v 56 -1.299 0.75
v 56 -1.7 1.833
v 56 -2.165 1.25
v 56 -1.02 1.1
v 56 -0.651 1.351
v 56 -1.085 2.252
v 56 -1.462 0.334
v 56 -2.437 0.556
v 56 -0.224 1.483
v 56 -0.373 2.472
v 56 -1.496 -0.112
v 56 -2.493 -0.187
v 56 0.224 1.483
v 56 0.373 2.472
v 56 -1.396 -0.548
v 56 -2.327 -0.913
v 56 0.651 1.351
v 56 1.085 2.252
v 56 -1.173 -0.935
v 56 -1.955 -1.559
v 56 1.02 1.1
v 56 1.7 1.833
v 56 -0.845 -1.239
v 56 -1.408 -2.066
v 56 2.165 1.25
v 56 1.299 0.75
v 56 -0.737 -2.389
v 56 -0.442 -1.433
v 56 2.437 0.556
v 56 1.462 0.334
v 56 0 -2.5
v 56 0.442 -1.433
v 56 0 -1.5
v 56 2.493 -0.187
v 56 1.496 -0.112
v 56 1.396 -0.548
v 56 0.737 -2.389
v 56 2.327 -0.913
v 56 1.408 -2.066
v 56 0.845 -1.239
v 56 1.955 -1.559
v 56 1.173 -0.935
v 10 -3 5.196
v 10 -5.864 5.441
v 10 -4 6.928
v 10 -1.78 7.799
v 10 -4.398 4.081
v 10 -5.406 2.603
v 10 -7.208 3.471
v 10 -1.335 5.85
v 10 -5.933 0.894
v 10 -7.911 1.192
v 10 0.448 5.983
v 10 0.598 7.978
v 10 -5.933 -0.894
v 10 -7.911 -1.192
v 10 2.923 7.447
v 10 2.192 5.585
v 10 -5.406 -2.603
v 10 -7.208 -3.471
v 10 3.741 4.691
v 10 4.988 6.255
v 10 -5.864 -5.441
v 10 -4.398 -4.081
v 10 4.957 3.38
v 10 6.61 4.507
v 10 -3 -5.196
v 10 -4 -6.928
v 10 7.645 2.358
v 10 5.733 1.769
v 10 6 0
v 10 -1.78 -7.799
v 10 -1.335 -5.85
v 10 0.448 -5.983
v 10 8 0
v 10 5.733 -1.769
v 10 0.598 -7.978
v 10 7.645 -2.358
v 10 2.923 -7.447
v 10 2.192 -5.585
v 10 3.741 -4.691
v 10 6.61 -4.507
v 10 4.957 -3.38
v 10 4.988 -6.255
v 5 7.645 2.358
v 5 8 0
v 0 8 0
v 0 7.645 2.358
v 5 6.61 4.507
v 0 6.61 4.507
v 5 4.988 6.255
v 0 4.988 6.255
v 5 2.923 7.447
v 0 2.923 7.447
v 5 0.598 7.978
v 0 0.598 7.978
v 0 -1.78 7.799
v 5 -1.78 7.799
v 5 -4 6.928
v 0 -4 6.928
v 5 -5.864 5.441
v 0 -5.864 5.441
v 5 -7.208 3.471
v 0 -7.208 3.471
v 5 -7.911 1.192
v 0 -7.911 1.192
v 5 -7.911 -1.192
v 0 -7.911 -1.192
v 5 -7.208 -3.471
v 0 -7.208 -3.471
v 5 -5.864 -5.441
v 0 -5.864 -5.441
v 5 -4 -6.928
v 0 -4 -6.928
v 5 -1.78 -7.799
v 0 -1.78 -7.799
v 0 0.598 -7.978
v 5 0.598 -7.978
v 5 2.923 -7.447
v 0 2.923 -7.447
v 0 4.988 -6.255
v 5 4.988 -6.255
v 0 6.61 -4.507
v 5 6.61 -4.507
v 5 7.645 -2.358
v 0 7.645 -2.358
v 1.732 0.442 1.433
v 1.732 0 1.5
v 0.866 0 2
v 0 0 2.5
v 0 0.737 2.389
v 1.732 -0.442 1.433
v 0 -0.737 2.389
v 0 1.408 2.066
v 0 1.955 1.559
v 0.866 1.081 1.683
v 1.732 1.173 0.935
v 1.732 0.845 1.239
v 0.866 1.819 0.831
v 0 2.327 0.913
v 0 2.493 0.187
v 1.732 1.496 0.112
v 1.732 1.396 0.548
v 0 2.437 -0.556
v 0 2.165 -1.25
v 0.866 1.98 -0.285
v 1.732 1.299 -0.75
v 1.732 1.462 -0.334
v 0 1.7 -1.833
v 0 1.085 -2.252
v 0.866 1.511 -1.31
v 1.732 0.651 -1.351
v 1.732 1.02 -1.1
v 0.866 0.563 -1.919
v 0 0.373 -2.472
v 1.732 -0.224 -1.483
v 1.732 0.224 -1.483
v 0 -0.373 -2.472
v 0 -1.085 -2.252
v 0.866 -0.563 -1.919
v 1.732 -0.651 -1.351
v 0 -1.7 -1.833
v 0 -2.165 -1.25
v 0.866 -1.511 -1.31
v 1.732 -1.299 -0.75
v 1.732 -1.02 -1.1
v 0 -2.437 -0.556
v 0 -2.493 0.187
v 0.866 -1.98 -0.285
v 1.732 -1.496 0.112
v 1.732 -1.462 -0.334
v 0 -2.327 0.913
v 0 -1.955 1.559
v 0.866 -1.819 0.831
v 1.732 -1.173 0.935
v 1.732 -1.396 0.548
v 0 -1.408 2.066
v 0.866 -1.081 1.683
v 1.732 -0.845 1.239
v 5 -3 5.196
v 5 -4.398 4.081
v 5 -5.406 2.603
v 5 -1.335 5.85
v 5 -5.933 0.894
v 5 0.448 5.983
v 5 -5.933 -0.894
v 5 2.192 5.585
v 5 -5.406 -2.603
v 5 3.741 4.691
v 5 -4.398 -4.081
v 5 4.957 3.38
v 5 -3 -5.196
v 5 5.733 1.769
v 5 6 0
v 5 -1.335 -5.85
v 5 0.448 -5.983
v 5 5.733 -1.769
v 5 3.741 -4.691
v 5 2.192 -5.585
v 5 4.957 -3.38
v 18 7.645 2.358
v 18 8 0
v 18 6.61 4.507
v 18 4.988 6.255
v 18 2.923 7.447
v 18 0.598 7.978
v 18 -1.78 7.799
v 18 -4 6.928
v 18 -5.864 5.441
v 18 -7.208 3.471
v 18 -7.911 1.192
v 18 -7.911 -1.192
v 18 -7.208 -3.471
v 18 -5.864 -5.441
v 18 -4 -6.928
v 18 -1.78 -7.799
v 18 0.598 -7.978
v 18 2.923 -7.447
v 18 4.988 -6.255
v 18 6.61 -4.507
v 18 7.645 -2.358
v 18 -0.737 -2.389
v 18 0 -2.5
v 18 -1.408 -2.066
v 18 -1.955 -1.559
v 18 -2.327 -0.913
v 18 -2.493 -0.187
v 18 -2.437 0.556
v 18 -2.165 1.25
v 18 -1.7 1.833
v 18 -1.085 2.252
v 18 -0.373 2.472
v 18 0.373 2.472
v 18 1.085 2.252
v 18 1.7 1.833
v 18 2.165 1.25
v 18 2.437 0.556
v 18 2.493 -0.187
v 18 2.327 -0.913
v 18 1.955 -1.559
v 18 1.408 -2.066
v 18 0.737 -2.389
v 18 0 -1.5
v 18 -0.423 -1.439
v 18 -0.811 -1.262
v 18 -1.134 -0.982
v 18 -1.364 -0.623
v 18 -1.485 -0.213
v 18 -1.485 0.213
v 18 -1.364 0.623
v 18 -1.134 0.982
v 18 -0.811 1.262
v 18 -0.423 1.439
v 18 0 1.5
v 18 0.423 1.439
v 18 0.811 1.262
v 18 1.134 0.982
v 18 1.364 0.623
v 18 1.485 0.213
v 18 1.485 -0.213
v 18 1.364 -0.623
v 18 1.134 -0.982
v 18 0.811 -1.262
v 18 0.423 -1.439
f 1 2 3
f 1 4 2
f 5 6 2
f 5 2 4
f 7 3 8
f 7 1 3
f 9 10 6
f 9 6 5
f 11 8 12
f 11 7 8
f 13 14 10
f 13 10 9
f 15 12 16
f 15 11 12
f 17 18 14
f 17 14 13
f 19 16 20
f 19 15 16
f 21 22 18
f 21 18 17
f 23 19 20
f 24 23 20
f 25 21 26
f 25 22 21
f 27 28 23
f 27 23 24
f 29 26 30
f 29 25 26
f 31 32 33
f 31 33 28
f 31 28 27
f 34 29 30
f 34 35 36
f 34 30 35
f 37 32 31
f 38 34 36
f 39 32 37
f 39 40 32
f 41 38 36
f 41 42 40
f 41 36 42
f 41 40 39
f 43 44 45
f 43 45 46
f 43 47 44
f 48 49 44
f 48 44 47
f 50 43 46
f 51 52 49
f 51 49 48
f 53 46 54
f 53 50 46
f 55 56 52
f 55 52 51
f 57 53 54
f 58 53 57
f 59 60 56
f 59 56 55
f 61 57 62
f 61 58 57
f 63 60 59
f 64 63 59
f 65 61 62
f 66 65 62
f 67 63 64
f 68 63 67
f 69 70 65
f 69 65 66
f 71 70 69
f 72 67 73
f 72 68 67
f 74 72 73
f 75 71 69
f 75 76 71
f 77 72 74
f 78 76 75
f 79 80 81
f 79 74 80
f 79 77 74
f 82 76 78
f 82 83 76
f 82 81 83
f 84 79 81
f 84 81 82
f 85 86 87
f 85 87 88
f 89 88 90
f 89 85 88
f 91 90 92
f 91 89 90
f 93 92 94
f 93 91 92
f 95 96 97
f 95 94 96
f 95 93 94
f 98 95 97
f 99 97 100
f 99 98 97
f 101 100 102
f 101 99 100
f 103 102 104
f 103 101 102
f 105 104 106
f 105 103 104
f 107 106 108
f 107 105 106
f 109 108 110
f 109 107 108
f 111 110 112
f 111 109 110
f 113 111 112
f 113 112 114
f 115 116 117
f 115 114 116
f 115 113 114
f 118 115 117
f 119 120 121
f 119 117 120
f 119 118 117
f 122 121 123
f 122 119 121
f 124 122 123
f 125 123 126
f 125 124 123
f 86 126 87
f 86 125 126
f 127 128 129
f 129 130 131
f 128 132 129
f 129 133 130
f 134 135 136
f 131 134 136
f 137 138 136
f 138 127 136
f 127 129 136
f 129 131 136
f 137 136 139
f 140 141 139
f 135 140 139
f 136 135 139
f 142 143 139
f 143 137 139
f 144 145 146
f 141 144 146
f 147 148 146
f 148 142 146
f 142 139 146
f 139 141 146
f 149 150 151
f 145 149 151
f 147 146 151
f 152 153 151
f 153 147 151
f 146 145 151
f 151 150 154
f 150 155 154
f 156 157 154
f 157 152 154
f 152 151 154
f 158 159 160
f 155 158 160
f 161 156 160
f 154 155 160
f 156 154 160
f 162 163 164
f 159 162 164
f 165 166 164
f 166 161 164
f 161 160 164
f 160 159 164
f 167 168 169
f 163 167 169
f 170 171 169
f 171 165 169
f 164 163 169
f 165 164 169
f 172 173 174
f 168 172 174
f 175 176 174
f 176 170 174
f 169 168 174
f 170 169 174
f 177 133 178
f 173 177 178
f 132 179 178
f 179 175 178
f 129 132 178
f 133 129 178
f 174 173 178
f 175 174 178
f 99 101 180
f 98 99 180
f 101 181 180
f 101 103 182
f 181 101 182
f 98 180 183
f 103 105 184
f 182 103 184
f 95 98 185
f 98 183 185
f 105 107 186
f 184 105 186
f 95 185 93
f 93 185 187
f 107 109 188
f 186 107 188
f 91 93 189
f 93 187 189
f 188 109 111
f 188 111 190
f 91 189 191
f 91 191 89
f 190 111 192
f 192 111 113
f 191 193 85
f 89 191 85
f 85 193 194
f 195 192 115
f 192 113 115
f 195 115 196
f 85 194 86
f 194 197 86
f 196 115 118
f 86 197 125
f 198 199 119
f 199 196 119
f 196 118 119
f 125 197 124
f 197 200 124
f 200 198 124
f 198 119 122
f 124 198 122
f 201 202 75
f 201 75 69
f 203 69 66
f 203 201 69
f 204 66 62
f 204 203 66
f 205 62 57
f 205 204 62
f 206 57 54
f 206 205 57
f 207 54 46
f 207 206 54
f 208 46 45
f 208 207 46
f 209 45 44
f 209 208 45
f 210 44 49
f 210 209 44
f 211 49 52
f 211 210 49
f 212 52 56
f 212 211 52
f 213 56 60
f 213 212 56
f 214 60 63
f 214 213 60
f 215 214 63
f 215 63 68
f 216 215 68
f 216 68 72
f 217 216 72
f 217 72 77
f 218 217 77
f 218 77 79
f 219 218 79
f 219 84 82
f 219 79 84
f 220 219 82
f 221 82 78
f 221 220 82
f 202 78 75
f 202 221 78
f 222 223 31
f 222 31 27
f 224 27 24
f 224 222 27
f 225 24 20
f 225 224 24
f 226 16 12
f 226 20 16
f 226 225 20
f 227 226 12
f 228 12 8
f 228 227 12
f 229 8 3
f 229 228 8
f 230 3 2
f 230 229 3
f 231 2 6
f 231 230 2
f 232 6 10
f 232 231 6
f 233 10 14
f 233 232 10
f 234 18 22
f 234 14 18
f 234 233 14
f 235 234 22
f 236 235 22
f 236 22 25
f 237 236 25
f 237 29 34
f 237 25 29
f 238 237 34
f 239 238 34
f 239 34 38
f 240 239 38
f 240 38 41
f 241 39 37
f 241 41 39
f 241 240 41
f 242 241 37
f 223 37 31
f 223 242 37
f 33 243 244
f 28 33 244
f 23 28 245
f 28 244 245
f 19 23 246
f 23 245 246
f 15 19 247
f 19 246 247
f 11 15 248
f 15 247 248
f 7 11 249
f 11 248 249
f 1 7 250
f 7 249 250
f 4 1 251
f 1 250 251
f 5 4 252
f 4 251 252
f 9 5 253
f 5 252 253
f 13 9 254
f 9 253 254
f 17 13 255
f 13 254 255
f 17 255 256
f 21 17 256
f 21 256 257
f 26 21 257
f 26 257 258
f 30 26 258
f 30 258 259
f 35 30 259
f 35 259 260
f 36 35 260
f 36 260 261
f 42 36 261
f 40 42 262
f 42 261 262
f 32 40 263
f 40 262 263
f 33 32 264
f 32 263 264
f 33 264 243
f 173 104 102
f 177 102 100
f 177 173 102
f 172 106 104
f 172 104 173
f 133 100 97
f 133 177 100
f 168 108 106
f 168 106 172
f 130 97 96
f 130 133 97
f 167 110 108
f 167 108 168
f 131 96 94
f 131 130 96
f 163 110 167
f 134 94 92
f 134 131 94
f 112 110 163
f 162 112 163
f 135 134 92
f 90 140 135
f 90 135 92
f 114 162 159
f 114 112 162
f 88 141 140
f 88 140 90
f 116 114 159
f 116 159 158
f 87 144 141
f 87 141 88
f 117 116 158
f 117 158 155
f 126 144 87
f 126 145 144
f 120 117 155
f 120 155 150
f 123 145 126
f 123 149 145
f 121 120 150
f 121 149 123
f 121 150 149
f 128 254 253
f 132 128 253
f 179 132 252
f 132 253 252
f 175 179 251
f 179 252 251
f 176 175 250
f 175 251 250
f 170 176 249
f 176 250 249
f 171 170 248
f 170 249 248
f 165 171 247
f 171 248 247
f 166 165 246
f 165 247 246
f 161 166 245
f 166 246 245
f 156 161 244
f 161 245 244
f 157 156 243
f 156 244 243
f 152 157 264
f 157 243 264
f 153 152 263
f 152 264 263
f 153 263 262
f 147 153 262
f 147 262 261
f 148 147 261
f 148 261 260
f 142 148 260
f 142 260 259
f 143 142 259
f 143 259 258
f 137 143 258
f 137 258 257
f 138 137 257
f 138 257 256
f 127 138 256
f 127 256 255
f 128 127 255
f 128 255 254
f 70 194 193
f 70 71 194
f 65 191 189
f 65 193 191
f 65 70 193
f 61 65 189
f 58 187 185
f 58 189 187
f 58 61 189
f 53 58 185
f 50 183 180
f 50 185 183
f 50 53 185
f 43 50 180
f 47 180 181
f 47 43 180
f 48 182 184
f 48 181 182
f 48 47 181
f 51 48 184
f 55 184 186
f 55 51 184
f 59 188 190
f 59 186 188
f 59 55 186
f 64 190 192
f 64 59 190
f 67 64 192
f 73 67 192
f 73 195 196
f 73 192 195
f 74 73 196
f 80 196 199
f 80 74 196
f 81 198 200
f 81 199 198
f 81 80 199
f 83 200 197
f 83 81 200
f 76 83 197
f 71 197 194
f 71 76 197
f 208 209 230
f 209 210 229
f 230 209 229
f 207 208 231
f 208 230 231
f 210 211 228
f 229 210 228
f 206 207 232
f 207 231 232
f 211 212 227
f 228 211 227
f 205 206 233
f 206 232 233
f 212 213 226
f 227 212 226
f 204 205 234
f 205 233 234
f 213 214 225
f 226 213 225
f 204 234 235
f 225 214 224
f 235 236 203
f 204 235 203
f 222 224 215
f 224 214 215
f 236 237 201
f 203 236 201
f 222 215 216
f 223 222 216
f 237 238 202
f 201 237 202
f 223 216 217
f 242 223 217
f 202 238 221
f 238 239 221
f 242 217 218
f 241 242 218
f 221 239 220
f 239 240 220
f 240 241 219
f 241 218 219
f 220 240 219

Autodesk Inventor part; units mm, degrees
ref_plane "YZ Plane" through (0, 0, 0) normal (1, 0, 0) x (0, 1, 0)
ref_plane "XZ Plane" through (0, 0, 0) normal (0, 1, 0) x (-1, 0, 0)
ref_plane "XY Plane" through (0, 0, 0) normal (0, 0, 1) x (1, 0, 0)
sketch "Sketch1" plane through (0, 0, 0) normal (0, 0, 1) x (1, 0, 0)
  line L0 (0, 0) -> (0, 8)
  line L1 (0, 8) -> (5, 8)
  line L2 (5, 8) -> (5, 6)
  line L3 (5, 6) -> (10, 6)
  line L4 (10, 6) -> (10, 8)
  line L5 (10, 8) -> (18, 8)
  line L6 (18, 8) -> (18, 0)
  line L7 (18, 0) -> (0, 0)
  dimension "d0" = 18
  dimension "d1" = 5
  dimension "d2" = 5
  dimension "d3" = 2
  dimension "d4" = 8
revolve "Revolution1" add sketch "Sketch1" angle 360 about axis through (18, 0, 0) along (-1, 0, 0)
sketch "Sketch2" plane through (0, 0, 0) normal (-1, 0, 0) x (0, 0, 1)
  circle A0 centre (0, 0) radius 8 projected
hole "Hole1" at (0, 0, 0) direction (1, 0, 0) diameter 3 end through all countersink diameter 5 countersink angle 60
sketch "Sketch3" plane through (18, 0, 0) normal (1, 0, 0) x (0, 0, -1)
  circle A0 centre (0, 0) radius 1.5 projected
  circle A1 centre (0, 0) radius 8 projected
  circle A2 centre (0, 0) radius 2.5
  dimension "d13" = 5
extrude "Extrusion1" add sketch "Sketch3" along normal blind 38 contours A2
properties part number "hotend_mount" material "Aluminum 6061"
